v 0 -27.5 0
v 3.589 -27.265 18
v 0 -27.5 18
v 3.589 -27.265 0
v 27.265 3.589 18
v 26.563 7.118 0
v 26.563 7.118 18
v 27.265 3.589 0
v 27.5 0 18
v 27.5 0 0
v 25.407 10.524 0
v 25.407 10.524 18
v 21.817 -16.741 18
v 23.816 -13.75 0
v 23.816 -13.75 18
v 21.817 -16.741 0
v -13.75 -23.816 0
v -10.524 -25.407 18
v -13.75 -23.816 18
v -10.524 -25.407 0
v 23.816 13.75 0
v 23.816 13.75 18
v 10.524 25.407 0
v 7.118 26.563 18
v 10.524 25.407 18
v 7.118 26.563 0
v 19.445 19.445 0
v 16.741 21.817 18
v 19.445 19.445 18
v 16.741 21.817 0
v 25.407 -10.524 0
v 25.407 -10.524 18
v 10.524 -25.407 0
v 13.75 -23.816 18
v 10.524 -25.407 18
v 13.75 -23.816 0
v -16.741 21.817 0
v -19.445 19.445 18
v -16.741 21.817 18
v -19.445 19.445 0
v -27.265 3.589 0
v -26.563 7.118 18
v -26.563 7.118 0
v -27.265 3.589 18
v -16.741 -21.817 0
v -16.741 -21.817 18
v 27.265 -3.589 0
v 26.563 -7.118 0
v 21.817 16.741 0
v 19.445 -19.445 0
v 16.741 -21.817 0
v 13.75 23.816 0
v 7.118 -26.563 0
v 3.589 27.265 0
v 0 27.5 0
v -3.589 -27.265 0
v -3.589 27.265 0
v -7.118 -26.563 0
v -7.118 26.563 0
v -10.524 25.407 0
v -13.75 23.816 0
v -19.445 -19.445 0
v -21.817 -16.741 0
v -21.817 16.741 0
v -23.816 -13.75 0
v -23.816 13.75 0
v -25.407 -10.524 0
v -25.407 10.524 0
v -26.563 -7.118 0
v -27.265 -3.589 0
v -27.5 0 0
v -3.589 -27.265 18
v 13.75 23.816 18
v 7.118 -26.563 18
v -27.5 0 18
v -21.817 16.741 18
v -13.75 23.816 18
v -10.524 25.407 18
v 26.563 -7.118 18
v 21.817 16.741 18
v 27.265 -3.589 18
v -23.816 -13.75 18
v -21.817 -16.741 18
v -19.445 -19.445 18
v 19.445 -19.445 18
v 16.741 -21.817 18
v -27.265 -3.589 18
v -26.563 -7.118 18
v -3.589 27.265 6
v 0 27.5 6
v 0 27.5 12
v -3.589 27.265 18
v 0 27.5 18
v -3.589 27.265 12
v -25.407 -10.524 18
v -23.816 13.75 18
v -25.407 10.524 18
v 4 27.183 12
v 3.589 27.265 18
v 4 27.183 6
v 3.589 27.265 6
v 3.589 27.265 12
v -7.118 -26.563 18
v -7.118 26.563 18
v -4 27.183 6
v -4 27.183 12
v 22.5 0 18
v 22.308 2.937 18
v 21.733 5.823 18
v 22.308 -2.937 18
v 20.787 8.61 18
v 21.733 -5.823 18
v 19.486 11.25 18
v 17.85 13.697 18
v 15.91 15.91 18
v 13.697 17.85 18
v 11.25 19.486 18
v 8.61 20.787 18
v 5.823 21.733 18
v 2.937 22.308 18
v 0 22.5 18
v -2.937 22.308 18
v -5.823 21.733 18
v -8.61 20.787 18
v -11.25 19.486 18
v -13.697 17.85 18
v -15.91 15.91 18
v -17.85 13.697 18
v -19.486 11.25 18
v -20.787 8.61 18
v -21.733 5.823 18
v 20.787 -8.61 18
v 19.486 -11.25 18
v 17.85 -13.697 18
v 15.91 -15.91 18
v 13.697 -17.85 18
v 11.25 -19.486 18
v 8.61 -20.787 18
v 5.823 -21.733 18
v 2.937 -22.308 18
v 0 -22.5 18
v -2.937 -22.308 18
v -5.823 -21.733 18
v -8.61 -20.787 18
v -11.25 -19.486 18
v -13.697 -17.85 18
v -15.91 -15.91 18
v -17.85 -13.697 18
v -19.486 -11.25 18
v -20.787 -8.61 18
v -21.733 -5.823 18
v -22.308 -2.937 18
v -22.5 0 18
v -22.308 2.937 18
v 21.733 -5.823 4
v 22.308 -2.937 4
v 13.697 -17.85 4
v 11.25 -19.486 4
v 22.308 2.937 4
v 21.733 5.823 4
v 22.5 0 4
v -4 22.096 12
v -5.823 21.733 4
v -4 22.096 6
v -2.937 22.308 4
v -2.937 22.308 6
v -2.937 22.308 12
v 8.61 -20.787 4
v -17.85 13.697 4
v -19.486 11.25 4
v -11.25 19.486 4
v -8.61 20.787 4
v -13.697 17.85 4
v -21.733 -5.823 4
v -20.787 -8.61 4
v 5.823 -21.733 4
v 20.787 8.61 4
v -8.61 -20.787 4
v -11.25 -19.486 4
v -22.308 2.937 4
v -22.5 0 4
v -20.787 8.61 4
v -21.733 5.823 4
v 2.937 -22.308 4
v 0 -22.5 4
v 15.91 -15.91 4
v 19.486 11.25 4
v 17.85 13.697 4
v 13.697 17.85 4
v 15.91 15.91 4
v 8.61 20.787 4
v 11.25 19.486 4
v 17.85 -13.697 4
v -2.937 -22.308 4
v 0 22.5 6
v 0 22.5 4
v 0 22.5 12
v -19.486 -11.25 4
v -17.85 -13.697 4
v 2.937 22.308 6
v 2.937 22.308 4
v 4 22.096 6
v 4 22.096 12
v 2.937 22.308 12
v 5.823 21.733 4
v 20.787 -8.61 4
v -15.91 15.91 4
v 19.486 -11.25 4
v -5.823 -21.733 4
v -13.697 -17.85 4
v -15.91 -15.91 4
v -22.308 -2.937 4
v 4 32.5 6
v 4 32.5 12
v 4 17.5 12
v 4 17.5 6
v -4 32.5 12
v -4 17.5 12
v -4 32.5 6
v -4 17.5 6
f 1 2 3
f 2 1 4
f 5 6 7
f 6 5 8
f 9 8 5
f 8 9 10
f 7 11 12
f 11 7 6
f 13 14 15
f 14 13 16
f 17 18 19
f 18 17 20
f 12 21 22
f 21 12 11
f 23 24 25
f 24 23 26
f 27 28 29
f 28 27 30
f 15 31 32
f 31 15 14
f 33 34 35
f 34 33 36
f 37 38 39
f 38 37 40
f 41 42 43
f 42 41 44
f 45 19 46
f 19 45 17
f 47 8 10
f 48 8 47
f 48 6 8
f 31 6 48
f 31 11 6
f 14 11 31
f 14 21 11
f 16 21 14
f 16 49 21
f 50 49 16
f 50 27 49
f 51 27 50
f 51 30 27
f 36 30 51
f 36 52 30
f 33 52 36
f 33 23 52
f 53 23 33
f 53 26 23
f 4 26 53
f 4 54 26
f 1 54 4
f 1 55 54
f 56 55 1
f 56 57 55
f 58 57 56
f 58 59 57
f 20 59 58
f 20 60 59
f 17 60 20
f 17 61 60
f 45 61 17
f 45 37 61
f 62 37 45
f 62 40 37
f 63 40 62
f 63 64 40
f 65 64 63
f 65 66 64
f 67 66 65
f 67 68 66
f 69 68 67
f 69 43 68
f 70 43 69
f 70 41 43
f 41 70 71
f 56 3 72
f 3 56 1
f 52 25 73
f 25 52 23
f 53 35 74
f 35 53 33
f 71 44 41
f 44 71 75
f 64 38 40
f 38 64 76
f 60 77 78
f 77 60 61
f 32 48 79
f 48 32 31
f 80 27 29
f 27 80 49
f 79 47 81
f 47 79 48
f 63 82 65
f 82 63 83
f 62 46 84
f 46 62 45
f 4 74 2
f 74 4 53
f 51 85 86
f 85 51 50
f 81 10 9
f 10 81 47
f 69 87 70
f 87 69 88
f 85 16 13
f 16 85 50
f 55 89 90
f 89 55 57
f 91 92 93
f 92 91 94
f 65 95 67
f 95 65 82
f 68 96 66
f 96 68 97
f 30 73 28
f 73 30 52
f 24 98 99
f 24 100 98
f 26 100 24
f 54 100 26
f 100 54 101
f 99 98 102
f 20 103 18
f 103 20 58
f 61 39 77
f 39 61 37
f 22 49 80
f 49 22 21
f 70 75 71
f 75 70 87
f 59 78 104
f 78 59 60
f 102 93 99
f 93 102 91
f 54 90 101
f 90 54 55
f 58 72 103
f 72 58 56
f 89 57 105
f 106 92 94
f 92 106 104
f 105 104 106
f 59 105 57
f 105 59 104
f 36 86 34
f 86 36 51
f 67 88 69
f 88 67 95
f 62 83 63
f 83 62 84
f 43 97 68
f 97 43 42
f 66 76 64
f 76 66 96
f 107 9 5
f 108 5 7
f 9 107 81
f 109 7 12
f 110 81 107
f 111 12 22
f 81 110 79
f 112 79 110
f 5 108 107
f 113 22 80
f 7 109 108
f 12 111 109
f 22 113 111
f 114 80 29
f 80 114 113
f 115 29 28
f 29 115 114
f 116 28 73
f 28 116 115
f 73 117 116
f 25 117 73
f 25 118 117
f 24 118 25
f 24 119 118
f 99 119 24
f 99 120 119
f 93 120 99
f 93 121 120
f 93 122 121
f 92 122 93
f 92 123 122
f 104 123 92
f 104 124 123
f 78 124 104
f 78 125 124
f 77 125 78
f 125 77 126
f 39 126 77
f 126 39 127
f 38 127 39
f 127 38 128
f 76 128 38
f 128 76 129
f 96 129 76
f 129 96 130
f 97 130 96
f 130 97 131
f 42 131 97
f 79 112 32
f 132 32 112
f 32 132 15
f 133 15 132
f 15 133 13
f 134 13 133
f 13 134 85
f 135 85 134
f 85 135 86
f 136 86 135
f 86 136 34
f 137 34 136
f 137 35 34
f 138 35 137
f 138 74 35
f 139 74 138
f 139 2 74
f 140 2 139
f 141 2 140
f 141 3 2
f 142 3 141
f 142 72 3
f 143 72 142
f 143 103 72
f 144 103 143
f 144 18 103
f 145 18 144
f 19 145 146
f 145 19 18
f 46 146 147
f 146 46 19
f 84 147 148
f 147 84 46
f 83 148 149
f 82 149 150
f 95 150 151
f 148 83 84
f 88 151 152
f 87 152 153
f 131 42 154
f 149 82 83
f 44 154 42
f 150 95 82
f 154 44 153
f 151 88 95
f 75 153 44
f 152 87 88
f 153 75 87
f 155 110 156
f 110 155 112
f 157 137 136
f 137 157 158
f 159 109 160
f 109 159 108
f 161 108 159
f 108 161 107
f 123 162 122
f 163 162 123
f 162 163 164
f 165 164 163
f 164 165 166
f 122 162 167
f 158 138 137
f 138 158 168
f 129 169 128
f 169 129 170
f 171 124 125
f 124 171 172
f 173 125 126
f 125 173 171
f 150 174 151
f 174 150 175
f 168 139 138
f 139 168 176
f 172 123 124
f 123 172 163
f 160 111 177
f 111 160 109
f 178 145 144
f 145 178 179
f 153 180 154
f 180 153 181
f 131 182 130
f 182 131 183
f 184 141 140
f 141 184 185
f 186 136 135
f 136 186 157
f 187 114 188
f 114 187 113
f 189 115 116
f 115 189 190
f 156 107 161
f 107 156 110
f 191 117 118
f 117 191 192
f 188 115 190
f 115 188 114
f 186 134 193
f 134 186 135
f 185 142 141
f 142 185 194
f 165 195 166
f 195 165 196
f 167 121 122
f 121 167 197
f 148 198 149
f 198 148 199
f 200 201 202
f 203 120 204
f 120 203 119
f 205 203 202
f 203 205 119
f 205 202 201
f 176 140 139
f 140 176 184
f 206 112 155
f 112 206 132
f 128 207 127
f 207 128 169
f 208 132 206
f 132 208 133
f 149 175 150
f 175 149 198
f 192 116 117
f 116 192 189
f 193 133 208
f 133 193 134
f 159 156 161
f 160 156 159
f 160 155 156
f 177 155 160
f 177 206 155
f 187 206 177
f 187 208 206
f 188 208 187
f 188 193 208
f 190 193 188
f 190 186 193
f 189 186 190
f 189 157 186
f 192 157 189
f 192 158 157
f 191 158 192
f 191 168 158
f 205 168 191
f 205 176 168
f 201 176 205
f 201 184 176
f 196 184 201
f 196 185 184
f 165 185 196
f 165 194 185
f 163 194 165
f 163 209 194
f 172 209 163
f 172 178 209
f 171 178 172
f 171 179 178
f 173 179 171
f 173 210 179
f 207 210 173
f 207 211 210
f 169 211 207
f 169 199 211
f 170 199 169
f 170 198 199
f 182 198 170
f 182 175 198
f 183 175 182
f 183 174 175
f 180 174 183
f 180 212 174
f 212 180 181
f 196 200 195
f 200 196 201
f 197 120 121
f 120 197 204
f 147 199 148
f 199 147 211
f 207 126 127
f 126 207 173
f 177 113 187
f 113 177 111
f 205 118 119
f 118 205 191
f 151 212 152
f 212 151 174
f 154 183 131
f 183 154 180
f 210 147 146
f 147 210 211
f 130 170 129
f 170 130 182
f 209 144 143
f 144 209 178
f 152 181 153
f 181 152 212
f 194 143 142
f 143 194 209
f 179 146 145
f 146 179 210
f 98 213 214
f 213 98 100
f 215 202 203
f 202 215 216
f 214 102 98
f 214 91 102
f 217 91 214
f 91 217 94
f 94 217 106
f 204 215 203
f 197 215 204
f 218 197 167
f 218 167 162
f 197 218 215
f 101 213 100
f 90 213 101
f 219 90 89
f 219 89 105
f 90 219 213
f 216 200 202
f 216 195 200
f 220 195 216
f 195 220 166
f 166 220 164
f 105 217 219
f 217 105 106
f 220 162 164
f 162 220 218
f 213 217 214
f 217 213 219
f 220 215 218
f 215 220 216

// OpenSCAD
// Ultrasonic transducer clamp for feed manifold
module us_mount_ring() {
  difference() {
    cylinder(h=18, d=55, $fn=48);
    translate([0, 0, 4]) cylinder(h=18, d=45, $fn=48);
  }
  translate([0, 25, 9]) cube([8, 15, 6], center=true);
}
us_mount_ring();
